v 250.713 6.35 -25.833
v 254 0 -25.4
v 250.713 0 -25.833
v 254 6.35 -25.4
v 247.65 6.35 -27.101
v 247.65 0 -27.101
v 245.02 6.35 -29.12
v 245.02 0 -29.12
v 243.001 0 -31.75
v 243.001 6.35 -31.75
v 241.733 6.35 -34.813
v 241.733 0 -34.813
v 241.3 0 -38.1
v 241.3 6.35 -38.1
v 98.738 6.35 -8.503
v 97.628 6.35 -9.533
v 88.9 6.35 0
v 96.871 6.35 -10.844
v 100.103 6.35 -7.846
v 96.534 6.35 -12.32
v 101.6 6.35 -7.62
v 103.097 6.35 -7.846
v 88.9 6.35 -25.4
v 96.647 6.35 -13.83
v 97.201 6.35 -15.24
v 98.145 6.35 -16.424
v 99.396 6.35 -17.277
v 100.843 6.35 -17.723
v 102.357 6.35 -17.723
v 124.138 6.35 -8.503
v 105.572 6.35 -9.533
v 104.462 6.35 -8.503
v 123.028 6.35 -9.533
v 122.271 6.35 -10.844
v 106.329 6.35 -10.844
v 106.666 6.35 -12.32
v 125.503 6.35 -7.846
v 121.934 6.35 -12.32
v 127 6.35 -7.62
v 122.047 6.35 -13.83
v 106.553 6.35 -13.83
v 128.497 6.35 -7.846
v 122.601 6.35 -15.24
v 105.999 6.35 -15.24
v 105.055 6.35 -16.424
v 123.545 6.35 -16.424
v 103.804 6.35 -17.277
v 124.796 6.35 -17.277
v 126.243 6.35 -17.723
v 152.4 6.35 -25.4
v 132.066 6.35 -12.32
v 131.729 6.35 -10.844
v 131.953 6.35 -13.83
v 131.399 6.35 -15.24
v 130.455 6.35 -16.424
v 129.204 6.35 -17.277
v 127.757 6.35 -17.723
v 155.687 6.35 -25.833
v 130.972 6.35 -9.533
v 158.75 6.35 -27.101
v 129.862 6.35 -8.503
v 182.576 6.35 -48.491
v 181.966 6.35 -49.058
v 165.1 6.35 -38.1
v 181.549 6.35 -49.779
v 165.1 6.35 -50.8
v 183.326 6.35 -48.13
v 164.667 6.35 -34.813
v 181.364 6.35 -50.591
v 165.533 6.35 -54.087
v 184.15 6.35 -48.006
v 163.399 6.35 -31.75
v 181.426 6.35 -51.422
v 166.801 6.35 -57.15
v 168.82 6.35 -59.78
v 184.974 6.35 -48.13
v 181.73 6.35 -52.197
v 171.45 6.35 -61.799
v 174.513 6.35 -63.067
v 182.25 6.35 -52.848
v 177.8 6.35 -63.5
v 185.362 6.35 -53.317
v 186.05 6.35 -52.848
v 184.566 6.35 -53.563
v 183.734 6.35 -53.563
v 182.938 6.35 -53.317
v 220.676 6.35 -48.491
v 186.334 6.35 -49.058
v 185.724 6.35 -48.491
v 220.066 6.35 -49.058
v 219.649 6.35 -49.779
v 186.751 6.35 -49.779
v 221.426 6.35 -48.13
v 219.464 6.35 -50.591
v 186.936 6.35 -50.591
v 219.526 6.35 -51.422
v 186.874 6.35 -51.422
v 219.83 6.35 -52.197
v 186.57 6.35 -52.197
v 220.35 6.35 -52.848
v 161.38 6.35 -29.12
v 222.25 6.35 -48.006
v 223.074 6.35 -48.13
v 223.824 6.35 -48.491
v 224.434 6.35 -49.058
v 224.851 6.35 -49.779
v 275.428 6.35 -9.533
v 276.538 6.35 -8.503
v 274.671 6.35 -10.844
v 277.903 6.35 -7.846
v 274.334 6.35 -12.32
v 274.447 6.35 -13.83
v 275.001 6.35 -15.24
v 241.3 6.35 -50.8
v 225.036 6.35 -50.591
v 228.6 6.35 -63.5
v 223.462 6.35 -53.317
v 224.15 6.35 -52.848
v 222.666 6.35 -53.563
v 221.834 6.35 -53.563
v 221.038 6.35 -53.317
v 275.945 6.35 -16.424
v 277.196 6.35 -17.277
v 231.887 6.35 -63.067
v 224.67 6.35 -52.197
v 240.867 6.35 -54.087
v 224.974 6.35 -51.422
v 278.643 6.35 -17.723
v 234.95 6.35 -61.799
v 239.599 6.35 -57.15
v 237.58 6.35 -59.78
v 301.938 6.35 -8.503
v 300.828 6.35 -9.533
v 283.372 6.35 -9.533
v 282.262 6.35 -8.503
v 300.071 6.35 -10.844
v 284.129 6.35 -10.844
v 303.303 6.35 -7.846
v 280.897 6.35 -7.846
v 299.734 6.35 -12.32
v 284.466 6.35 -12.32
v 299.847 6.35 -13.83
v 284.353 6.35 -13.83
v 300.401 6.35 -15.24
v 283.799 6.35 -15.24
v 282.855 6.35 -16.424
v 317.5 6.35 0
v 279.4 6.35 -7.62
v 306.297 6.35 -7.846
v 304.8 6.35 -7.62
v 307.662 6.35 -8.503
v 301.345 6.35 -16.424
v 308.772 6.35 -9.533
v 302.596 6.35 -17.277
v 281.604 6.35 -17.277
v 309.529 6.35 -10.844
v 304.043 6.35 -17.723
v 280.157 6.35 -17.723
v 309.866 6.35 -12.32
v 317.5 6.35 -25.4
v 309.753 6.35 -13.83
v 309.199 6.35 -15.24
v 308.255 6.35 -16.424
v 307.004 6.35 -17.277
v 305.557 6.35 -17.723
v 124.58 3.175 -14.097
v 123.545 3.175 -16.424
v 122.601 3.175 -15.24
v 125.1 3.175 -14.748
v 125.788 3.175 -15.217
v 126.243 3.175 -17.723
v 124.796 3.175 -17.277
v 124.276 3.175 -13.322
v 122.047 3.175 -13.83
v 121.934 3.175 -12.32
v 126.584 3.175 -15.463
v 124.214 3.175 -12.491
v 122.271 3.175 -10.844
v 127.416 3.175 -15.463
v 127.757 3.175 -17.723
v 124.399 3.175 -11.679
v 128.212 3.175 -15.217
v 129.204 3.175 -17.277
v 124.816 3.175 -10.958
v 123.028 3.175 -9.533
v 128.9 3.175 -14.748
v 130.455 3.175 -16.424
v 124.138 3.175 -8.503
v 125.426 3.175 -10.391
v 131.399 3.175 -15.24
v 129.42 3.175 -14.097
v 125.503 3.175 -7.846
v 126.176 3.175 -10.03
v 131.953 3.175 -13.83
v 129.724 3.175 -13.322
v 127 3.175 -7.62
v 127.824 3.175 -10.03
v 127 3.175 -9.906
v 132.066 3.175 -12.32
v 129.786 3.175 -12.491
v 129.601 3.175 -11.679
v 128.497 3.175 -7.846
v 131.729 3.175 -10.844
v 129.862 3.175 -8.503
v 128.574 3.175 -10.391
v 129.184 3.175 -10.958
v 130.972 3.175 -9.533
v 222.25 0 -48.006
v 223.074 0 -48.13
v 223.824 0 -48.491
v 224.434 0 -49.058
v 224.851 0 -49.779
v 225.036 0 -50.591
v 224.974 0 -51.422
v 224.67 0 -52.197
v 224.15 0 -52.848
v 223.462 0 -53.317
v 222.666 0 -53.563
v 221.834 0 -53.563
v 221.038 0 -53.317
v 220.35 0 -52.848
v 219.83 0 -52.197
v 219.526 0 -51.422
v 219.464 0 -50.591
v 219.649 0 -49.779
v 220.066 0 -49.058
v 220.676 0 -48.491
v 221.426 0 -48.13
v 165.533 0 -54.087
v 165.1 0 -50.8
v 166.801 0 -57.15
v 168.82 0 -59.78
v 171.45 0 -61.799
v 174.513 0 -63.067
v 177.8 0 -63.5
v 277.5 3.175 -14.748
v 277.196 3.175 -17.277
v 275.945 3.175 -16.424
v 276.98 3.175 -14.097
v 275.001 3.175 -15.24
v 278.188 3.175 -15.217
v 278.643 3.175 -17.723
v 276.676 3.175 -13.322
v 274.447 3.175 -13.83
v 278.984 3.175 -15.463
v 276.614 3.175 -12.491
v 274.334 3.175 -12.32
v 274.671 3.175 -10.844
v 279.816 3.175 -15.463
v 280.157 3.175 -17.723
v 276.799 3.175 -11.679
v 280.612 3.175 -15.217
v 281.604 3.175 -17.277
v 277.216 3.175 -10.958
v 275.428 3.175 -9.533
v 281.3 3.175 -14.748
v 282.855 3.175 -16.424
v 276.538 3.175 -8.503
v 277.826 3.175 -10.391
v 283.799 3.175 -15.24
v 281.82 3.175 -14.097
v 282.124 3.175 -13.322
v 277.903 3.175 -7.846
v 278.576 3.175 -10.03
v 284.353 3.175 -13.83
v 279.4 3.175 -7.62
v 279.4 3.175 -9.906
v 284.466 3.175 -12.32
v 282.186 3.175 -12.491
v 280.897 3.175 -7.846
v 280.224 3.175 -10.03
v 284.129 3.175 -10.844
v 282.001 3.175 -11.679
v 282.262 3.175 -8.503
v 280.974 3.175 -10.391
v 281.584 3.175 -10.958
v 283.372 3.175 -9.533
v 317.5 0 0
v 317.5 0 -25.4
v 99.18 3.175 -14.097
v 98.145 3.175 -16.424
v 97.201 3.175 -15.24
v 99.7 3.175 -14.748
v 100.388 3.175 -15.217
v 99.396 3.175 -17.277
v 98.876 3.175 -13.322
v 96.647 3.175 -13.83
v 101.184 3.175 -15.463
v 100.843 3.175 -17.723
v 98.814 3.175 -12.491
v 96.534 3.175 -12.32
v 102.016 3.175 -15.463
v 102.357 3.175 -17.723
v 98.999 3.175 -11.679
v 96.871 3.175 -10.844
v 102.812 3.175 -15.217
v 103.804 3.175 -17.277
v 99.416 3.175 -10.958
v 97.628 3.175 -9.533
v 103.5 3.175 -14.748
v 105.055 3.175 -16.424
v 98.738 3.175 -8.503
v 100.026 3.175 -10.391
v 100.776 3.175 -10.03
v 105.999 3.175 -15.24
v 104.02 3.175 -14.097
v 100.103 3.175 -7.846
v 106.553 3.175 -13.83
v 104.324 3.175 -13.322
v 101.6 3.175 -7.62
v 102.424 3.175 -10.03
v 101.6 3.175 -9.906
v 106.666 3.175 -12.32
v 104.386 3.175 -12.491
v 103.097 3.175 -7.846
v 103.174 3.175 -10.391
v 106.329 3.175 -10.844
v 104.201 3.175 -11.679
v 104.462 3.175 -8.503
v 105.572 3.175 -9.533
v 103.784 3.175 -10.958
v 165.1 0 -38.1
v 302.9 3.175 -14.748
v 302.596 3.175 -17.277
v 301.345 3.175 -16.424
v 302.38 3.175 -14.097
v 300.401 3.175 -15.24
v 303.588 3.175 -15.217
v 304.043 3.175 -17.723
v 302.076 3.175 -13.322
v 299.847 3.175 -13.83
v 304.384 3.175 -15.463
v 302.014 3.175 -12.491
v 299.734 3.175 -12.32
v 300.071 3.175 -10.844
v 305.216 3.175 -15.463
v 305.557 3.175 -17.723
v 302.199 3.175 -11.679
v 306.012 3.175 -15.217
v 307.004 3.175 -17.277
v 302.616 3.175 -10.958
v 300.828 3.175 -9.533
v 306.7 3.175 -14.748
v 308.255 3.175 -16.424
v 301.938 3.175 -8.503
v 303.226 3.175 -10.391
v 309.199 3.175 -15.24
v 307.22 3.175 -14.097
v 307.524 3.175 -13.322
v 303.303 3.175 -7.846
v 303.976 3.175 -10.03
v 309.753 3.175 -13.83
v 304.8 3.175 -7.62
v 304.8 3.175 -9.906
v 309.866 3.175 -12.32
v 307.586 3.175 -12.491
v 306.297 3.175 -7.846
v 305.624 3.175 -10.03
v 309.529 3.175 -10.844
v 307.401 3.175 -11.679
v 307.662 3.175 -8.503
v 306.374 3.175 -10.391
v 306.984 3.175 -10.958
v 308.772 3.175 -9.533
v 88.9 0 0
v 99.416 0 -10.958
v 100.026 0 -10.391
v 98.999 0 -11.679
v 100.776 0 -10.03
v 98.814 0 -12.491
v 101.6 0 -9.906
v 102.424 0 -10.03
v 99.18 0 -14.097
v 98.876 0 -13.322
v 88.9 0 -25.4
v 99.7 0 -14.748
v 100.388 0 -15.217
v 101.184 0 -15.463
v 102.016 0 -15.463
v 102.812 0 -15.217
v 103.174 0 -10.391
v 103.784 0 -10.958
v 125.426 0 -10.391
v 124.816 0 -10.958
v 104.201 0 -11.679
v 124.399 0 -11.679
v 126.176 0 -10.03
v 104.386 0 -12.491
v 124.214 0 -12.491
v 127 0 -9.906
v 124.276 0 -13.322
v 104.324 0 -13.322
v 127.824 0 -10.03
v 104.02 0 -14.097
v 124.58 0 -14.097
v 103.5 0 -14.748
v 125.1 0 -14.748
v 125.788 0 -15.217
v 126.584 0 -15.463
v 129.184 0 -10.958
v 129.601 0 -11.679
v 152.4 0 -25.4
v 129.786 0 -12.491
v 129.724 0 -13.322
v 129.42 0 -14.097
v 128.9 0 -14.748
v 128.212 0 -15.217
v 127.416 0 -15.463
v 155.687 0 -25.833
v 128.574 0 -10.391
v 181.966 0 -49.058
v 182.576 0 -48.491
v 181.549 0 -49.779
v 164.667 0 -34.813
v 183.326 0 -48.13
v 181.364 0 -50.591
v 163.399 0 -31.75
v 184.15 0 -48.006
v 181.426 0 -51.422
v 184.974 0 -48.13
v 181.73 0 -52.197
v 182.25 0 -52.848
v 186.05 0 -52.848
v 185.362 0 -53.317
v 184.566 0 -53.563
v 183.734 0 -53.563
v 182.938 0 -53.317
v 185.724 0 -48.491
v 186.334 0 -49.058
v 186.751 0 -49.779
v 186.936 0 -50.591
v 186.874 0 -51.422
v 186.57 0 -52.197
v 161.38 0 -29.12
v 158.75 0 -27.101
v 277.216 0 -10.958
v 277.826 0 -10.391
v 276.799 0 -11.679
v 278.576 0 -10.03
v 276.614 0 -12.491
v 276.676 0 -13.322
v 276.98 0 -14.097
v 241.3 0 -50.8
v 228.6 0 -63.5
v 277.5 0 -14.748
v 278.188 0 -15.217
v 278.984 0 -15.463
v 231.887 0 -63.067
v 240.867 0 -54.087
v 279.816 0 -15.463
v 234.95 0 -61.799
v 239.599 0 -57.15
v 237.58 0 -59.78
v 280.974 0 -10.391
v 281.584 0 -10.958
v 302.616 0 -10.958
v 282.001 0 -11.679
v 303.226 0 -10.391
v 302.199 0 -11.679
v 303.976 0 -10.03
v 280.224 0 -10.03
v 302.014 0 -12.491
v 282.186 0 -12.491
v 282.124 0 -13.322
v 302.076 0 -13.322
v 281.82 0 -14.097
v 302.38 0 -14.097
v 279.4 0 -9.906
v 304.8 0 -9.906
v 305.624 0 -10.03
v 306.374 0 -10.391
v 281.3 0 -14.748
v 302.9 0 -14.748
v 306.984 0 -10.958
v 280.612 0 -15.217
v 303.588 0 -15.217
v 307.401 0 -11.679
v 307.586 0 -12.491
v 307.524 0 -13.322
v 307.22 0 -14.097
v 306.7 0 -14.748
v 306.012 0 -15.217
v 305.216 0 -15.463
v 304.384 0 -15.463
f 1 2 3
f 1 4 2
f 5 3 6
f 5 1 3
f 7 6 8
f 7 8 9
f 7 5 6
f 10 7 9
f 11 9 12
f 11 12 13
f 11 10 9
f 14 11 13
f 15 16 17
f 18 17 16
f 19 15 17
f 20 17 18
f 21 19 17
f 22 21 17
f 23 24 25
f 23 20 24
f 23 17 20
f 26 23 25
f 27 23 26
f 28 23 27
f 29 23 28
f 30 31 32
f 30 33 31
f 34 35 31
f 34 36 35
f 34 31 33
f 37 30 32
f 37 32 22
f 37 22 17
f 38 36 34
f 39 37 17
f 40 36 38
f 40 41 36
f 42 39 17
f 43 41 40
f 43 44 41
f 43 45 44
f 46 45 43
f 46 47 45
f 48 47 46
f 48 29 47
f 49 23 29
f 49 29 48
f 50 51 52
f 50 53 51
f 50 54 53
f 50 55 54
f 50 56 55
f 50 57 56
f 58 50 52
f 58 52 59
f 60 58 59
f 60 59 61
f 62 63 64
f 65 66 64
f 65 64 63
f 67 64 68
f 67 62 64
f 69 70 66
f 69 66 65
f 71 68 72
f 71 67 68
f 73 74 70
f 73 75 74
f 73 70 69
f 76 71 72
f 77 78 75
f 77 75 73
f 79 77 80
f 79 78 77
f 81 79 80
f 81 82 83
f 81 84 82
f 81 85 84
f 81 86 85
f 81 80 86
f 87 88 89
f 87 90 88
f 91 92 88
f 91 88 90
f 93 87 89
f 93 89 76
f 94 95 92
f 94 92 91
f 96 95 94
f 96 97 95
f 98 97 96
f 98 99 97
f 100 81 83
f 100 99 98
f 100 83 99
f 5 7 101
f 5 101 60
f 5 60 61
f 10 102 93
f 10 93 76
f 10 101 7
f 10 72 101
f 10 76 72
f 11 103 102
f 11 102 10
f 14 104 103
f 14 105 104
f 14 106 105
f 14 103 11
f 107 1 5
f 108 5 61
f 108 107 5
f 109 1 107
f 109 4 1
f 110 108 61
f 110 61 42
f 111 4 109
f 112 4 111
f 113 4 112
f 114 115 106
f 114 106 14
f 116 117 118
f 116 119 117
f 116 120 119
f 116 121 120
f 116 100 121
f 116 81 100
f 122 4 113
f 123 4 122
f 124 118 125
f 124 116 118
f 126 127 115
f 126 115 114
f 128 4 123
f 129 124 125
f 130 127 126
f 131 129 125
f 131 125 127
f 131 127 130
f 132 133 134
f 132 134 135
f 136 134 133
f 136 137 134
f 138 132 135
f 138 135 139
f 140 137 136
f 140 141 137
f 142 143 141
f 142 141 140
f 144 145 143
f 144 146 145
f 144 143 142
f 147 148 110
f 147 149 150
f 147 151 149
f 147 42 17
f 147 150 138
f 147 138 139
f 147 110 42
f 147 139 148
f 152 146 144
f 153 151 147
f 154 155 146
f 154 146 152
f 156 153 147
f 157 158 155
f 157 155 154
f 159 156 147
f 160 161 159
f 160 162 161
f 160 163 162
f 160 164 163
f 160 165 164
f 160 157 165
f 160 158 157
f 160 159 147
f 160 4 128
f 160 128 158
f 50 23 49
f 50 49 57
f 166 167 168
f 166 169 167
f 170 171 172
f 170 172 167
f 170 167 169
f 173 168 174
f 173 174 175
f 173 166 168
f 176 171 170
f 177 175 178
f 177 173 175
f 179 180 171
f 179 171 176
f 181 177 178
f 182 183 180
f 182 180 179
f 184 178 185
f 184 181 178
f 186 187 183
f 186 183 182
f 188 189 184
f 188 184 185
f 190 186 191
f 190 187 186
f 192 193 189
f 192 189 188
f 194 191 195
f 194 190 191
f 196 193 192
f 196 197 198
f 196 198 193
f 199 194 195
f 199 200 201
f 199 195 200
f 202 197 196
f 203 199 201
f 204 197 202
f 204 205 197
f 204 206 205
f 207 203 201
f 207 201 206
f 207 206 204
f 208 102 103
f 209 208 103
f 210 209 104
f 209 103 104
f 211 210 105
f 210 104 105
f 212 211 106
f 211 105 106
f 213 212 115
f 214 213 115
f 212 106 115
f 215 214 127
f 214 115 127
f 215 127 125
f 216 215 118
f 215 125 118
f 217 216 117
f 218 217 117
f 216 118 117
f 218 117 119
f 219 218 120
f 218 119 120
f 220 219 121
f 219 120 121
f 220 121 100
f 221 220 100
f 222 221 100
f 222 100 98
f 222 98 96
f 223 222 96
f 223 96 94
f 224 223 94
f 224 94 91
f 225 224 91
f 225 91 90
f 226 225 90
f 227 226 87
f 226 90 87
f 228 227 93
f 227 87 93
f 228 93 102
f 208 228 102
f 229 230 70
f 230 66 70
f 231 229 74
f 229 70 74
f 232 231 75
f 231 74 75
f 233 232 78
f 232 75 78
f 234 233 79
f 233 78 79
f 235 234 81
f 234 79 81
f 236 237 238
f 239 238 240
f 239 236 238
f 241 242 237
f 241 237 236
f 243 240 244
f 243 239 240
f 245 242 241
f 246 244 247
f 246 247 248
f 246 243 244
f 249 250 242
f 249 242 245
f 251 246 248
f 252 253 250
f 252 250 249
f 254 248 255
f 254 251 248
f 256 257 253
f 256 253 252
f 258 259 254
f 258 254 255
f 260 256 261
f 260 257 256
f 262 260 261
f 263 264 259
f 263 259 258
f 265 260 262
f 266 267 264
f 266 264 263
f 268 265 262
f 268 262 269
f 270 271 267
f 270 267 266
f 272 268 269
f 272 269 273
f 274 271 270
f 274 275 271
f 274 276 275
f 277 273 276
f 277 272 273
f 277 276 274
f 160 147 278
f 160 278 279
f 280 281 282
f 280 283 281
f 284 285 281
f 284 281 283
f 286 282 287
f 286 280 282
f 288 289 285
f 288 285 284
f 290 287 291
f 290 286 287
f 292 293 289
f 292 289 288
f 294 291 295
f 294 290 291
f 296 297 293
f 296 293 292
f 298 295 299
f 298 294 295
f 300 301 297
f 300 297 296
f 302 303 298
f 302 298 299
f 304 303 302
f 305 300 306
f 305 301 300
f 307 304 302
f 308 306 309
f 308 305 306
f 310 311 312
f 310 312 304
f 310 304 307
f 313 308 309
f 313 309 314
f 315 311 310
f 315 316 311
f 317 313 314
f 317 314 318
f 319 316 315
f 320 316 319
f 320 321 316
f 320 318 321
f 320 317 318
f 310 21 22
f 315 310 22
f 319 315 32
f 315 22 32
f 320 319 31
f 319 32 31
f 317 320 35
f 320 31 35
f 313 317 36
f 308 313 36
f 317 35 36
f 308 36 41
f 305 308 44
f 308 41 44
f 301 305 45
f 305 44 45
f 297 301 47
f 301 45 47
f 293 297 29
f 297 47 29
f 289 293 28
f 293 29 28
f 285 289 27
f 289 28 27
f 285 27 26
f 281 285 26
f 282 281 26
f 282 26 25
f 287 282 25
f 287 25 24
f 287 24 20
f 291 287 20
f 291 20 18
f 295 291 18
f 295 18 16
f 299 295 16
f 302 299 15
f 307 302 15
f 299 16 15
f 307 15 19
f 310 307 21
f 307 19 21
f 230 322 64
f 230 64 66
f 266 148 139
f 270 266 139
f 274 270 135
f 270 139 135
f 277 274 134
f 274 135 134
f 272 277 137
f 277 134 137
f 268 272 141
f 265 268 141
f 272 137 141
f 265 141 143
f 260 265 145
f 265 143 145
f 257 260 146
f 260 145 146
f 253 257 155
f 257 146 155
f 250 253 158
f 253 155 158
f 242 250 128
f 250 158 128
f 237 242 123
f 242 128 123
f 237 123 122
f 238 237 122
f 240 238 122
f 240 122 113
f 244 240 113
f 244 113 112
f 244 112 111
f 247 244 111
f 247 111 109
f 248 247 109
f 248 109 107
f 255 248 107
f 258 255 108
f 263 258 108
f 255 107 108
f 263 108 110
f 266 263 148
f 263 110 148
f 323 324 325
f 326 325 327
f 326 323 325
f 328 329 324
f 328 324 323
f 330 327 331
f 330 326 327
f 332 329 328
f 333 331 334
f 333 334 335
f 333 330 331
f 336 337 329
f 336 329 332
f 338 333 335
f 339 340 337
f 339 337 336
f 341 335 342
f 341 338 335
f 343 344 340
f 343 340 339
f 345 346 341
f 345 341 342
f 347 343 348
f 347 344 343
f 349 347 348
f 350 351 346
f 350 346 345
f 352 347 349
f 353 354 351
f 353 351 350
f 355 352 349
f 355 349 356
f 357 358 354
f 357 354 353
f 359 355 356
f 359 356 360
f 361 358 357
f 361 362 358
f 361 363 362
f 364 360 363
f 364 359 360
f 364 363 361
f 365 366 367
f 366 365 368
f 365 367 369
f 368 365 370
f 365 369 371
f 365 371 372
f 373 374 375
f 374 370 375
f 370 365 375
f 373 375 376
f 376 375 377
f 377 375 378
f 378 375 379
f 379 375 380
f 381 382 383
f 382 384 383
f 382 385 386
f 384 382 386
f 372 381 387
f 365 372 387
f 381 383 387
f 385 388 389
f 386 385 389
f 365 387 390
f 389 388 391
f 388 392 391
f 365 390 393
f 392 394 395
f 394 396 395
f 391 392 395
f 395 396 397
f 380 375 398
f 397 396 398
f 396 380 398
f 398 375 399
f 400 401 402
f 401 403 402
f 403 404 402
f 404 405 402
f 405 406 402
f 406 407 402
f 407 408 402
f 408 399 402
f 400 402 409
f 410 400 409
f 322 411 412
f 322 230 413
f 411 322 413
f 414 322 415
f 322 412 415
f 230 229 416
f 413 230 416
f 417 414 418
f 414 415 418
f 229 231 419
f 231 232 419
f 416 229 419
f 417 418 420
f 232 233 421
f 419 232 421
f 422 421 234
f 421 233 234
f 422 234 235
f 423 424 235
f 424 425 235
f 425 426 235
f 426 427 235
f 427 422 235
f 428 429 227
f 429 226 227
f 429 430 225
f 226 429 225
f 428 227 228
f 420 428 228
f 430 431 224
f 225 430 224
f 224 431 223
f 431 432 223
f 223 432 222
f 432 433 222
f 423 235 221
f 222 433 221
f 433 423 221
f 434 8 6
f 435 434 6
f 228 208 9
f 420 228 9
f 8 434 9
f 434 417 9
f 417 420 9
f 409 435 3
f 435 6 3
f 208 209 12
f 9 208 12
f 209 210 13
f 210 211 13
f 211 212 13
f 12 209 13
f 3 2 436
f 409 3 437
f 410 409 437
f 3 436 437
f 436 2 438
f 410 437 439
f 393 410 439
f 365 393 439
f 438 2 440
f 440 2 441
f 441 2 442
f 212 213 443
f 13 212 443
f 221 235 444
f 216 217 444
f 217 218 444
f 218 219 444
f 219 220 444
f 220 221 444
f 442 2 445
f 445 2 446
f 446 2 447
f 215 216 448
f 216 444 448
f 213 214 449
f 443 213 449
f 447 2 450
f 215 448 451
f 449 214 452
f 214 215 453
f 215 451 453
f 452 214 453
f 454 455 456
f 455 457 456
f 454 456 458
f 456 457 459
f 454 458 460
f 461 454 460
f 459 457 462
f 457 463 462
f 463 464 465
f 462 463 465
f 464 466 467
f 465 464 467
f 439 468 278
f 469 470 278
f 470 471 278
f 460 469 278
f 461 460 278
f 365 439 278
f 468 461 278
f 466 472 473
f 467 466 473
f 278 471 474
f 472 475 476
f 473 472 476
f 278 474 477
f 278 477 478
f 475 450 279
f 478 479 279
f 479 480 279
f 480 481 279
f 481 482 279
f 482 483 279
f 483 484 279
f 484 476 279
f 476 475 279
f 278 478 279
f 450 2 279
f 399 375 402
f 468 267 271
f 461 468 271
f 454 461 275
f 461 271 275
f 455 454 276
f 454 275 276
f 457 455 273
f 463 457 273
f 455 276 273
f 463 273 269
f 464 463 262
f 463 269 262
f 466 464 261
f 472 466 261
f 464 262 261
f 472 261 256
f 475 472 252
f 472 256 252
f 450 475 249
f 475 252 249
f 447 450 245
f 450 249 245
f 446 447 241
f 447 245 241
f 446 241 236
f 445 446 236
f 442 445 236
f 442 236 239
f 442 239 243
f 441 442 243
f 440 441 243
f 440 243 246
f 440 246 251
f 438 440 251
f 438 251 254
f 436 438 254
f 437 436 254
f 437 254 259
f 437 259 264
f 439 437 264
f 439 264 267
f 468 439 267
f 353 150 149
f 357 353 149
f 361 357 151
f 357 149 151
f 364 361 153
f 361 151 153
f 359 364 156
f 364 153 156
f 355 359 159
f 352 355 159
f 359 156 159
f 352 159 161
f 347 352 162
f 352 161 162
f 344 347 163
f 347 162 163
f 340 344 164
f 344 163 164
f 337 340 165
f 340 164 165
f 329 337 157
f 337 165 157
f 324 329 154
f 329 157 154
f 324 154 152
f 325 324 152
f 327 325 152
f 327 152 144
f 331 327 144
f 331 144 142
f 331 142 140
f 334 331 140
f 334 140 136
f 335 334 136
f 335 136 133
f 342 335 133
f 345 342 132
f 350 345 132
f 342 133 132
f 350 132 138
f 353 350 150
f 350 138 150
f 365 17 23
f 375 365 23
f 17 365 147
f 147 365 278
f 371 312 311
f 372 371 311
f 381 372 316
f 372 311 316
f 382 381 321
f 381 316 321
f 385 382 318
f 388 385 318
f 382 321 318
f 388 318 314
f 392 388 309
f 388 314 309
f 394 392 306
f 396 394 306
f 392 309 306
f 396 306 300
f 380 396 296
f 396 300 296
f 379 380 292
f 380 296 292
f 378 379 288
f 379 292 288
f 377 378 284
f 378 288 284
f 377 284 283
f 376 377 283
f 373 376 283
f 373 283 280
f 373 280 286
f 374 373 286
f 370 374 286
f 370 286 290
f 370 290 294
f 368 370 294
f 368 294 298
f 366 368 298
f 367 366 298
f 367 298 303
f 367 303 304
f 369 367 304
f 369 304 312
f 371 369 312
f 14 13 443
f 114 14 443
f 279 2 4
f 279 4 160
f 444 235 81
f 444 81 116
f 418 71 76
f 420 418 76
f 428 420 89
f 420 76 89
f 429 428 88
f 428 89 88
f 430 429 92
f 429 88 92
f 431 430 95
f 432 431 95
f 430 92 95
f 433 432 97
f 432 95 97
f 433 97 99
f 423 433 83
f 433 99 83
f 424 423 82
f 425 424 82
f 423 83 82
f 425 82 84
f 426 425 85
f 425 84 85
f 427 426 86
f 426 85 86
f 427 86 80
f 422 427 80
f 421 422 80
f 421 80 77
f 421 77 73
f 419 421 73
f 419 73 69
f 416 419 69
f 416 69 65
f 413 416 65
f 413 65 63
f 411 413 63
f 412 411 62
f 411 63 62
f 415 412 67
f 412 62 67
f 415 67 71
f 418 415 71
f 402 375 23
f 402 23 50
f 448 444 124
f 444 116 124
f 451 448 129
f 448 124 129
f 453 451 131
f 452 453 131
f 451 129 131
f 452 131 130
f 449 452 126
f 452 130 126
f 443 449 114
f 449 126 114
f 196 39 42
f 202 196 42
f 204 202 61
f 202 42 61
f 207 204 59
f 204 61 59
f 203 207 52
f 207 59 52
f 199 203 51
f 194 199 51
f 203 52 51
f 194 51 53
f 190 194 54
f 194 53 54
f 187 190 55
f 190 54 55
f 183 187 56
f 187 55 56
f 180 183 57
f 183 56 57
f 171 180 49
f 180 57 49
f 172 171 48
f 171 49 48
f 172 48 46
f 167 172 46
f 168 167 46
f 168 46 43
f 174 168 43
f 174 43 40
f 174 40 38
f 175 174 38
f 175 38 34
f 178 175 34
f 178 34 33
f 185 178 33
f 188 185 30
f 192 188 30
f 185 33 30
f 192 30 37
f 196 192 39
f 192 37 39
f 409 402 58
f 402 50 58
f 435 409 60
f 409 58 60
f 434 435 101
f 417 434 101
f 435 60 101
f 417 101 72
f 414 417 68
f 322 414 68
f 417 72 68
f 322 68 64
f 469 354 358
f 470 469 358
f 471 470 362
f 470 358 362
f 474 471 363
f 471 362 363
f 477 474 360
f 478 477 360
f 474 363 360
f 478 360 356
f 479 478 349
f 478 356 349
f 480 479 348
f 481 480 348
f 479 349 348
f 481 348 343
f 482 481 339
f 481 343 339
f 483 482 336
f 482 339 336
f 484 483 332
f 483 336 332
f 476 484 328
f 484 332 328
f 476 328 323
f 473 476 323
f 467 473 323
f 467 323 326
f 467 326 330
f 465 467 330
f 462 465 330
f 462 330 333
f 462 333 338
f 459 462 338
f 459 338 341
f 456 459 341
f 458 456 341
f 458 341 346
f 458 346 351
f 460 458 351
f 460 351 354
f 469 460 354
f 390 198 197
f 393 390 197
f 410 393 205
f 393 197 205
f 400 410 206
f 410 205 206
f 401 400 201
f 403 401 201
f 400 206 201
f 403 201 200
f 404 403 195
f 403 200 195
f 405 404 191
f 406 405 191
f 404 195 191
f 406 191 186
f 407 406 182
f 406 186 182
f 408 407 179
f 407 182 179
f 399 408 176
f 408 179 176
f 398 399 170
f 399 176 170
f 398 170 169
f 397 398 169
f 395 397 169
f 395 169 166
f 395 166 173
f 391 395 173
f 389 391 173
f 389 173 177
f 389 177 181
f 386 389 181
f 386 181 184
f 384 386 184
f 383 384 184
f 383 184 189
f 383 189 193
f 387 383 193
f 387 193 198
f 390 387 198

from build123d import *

# Parameters (mm, degrees)
SKETCH1_W           = 406.4
SKETCH1_H           = 25.4
SKETCH1_W_2         = 76.2
SKETCH1_H_2         = 38.1
BOSS_EXTRUDE1_DEPTH = 6.35
SKETCH3_R           = 2.794
CUT_EXTRUDE2_DEPTH  = 6.35
FILLET1_R           = 12.7
SKETCH4_R           = 2.794
CUT_EXTRUDE3_DEPTH  = 19.05
SKETCH5_R           = 5.08
CUT_EXTRUDE4_DEPTH  = 3.175
SKETCH6_W           = 88.9
SKETCH6_H           = 25.4
CUT_EXTRUDE5_DEPTH  = 6.35


with BuildPart() as part:
    # Sketch1 → Boss-Extrude1 (new body)
    with BuildSketch(Plane(origin=(0, 0, 0), x_dir=(1, 0, 0), z_dir=(0, 1, 0))):
        with Locations((203.2, 12.7)):
            Rectangle(SKETCH1_W, SKETCH1_H)
        with Locations((203.2, 44.45)):
            Rectangle(SKETCH1_W_2, SKETCH1_H_2)
    extrude(amount=BOSS_EXTRUDE1_DEPTH)

    # Sketch3 → Cut-Extrude2 (cut)
    with BuildSketch(Plane(origin=(0, 6.35, 0), x_dir=(1, 0, 0), z_dir=(0, 1, 0))):
        with Locations(Location((222.25, 50.8, 0), (0, 0, 270))):
            Circle(SKETCH3_R)
        with Locations(Location((184.15, 50.8, 0), (0, 0, 270))):
            Circle(SKETCH3_R)
    extrude(amount=-CUT_EXTRUDE2_DEPTH, mode=Mode.SUBTRACT)

    # Fillet1
    fillet1_edges = [part.edges().sort_by_distance(p)[0] for p in [
        (406.4, 3.175, 0),
        (406.4, 3.175, -25.4),
        (0, 3.175, 0),
        (0, 3.175, -25.4),
        (165.1, 3.175, -25.4),
        (241.3, 3.175, -25.4),
        (241.3, 3.175, -63.5),
        (165.1, 3.175, -63.5),
    ]]
    fillet(fillet1_edges, radius=FILLET1_R - 0.0001)  # a hair under: the kernel refuses the full size

    # Sketch4 → Cut-Extrude3 (cut)
    with BuildSketch(Plane(origin=(0, 6.35, 0), x_dir=(1, 0, 0), z_dir=(0, 1, 0))):
        with Locations(Location((279.4, 12.7, 0), (0, 0, 270))):
            Circle(SKETCH4_R)
        with Locations(Location((304.8, 12.7, 0), (0, 0, 270))):
            Circle(SKETCH4_R)
        with Locations(Location((127, 12.7, 0), (0, 0, 270))):
            Circle(SKETCH4_R)
        with Locations(Location((101.6, 12.7, 0), (0, 0, 270))):
            Circle(SKETCH4_R)
    extrude(amount=-CUT_EXTRUDE3_DEPTH, mode=Mode.SUBTRACT)

    # Sketch5 → Cut-Extrude4 (cut)
    with BuildSketch(Plane(origin=(0, 6.35, 0), x_dir=(1, 0, 0), z_dir=(0, 1, 0))):
        with Locations(Location((101.6, 12.7, 0), (0, 0, 270))):
            Circle(SKETCH5_R)
        with Locations(Location((127, 12.7, 0), (0, 0, 270))):
            Circle(SKETCH5_R)
        with Locations(Location((279.4, 12.7, 0), (0, 0, 270))):
            Circle(SKETCH5_R)
        with Locations(Location((304.8, 12.7, 0), (0, 0, 270))):
            Circle(SKETCH5_R)
    extrude(amount=-CUT_EXTRUDE4_DEPTH, mode=Mode.SUBTRACT)

    # Sketch6 → Cut-Extrude5 (cut)
    with BuildSketch(Plane(origin=(0, 6.35, 0), x_dir=(1, 0, 0), z_dir=(0, 1, 0))):
        with Locations((44.45, 12.7)):
            Rectangle(SKETCH6_W, SKETCH6_H)
        with Locations((361.95, 12.7)):
            Rectangle(SKETCH6_W, SKETCH6_H)
    extrude(amount=-CUT_EXTRUDE5_DEPTH, mode=Mode.SUBTRACT)


solid = part.part
